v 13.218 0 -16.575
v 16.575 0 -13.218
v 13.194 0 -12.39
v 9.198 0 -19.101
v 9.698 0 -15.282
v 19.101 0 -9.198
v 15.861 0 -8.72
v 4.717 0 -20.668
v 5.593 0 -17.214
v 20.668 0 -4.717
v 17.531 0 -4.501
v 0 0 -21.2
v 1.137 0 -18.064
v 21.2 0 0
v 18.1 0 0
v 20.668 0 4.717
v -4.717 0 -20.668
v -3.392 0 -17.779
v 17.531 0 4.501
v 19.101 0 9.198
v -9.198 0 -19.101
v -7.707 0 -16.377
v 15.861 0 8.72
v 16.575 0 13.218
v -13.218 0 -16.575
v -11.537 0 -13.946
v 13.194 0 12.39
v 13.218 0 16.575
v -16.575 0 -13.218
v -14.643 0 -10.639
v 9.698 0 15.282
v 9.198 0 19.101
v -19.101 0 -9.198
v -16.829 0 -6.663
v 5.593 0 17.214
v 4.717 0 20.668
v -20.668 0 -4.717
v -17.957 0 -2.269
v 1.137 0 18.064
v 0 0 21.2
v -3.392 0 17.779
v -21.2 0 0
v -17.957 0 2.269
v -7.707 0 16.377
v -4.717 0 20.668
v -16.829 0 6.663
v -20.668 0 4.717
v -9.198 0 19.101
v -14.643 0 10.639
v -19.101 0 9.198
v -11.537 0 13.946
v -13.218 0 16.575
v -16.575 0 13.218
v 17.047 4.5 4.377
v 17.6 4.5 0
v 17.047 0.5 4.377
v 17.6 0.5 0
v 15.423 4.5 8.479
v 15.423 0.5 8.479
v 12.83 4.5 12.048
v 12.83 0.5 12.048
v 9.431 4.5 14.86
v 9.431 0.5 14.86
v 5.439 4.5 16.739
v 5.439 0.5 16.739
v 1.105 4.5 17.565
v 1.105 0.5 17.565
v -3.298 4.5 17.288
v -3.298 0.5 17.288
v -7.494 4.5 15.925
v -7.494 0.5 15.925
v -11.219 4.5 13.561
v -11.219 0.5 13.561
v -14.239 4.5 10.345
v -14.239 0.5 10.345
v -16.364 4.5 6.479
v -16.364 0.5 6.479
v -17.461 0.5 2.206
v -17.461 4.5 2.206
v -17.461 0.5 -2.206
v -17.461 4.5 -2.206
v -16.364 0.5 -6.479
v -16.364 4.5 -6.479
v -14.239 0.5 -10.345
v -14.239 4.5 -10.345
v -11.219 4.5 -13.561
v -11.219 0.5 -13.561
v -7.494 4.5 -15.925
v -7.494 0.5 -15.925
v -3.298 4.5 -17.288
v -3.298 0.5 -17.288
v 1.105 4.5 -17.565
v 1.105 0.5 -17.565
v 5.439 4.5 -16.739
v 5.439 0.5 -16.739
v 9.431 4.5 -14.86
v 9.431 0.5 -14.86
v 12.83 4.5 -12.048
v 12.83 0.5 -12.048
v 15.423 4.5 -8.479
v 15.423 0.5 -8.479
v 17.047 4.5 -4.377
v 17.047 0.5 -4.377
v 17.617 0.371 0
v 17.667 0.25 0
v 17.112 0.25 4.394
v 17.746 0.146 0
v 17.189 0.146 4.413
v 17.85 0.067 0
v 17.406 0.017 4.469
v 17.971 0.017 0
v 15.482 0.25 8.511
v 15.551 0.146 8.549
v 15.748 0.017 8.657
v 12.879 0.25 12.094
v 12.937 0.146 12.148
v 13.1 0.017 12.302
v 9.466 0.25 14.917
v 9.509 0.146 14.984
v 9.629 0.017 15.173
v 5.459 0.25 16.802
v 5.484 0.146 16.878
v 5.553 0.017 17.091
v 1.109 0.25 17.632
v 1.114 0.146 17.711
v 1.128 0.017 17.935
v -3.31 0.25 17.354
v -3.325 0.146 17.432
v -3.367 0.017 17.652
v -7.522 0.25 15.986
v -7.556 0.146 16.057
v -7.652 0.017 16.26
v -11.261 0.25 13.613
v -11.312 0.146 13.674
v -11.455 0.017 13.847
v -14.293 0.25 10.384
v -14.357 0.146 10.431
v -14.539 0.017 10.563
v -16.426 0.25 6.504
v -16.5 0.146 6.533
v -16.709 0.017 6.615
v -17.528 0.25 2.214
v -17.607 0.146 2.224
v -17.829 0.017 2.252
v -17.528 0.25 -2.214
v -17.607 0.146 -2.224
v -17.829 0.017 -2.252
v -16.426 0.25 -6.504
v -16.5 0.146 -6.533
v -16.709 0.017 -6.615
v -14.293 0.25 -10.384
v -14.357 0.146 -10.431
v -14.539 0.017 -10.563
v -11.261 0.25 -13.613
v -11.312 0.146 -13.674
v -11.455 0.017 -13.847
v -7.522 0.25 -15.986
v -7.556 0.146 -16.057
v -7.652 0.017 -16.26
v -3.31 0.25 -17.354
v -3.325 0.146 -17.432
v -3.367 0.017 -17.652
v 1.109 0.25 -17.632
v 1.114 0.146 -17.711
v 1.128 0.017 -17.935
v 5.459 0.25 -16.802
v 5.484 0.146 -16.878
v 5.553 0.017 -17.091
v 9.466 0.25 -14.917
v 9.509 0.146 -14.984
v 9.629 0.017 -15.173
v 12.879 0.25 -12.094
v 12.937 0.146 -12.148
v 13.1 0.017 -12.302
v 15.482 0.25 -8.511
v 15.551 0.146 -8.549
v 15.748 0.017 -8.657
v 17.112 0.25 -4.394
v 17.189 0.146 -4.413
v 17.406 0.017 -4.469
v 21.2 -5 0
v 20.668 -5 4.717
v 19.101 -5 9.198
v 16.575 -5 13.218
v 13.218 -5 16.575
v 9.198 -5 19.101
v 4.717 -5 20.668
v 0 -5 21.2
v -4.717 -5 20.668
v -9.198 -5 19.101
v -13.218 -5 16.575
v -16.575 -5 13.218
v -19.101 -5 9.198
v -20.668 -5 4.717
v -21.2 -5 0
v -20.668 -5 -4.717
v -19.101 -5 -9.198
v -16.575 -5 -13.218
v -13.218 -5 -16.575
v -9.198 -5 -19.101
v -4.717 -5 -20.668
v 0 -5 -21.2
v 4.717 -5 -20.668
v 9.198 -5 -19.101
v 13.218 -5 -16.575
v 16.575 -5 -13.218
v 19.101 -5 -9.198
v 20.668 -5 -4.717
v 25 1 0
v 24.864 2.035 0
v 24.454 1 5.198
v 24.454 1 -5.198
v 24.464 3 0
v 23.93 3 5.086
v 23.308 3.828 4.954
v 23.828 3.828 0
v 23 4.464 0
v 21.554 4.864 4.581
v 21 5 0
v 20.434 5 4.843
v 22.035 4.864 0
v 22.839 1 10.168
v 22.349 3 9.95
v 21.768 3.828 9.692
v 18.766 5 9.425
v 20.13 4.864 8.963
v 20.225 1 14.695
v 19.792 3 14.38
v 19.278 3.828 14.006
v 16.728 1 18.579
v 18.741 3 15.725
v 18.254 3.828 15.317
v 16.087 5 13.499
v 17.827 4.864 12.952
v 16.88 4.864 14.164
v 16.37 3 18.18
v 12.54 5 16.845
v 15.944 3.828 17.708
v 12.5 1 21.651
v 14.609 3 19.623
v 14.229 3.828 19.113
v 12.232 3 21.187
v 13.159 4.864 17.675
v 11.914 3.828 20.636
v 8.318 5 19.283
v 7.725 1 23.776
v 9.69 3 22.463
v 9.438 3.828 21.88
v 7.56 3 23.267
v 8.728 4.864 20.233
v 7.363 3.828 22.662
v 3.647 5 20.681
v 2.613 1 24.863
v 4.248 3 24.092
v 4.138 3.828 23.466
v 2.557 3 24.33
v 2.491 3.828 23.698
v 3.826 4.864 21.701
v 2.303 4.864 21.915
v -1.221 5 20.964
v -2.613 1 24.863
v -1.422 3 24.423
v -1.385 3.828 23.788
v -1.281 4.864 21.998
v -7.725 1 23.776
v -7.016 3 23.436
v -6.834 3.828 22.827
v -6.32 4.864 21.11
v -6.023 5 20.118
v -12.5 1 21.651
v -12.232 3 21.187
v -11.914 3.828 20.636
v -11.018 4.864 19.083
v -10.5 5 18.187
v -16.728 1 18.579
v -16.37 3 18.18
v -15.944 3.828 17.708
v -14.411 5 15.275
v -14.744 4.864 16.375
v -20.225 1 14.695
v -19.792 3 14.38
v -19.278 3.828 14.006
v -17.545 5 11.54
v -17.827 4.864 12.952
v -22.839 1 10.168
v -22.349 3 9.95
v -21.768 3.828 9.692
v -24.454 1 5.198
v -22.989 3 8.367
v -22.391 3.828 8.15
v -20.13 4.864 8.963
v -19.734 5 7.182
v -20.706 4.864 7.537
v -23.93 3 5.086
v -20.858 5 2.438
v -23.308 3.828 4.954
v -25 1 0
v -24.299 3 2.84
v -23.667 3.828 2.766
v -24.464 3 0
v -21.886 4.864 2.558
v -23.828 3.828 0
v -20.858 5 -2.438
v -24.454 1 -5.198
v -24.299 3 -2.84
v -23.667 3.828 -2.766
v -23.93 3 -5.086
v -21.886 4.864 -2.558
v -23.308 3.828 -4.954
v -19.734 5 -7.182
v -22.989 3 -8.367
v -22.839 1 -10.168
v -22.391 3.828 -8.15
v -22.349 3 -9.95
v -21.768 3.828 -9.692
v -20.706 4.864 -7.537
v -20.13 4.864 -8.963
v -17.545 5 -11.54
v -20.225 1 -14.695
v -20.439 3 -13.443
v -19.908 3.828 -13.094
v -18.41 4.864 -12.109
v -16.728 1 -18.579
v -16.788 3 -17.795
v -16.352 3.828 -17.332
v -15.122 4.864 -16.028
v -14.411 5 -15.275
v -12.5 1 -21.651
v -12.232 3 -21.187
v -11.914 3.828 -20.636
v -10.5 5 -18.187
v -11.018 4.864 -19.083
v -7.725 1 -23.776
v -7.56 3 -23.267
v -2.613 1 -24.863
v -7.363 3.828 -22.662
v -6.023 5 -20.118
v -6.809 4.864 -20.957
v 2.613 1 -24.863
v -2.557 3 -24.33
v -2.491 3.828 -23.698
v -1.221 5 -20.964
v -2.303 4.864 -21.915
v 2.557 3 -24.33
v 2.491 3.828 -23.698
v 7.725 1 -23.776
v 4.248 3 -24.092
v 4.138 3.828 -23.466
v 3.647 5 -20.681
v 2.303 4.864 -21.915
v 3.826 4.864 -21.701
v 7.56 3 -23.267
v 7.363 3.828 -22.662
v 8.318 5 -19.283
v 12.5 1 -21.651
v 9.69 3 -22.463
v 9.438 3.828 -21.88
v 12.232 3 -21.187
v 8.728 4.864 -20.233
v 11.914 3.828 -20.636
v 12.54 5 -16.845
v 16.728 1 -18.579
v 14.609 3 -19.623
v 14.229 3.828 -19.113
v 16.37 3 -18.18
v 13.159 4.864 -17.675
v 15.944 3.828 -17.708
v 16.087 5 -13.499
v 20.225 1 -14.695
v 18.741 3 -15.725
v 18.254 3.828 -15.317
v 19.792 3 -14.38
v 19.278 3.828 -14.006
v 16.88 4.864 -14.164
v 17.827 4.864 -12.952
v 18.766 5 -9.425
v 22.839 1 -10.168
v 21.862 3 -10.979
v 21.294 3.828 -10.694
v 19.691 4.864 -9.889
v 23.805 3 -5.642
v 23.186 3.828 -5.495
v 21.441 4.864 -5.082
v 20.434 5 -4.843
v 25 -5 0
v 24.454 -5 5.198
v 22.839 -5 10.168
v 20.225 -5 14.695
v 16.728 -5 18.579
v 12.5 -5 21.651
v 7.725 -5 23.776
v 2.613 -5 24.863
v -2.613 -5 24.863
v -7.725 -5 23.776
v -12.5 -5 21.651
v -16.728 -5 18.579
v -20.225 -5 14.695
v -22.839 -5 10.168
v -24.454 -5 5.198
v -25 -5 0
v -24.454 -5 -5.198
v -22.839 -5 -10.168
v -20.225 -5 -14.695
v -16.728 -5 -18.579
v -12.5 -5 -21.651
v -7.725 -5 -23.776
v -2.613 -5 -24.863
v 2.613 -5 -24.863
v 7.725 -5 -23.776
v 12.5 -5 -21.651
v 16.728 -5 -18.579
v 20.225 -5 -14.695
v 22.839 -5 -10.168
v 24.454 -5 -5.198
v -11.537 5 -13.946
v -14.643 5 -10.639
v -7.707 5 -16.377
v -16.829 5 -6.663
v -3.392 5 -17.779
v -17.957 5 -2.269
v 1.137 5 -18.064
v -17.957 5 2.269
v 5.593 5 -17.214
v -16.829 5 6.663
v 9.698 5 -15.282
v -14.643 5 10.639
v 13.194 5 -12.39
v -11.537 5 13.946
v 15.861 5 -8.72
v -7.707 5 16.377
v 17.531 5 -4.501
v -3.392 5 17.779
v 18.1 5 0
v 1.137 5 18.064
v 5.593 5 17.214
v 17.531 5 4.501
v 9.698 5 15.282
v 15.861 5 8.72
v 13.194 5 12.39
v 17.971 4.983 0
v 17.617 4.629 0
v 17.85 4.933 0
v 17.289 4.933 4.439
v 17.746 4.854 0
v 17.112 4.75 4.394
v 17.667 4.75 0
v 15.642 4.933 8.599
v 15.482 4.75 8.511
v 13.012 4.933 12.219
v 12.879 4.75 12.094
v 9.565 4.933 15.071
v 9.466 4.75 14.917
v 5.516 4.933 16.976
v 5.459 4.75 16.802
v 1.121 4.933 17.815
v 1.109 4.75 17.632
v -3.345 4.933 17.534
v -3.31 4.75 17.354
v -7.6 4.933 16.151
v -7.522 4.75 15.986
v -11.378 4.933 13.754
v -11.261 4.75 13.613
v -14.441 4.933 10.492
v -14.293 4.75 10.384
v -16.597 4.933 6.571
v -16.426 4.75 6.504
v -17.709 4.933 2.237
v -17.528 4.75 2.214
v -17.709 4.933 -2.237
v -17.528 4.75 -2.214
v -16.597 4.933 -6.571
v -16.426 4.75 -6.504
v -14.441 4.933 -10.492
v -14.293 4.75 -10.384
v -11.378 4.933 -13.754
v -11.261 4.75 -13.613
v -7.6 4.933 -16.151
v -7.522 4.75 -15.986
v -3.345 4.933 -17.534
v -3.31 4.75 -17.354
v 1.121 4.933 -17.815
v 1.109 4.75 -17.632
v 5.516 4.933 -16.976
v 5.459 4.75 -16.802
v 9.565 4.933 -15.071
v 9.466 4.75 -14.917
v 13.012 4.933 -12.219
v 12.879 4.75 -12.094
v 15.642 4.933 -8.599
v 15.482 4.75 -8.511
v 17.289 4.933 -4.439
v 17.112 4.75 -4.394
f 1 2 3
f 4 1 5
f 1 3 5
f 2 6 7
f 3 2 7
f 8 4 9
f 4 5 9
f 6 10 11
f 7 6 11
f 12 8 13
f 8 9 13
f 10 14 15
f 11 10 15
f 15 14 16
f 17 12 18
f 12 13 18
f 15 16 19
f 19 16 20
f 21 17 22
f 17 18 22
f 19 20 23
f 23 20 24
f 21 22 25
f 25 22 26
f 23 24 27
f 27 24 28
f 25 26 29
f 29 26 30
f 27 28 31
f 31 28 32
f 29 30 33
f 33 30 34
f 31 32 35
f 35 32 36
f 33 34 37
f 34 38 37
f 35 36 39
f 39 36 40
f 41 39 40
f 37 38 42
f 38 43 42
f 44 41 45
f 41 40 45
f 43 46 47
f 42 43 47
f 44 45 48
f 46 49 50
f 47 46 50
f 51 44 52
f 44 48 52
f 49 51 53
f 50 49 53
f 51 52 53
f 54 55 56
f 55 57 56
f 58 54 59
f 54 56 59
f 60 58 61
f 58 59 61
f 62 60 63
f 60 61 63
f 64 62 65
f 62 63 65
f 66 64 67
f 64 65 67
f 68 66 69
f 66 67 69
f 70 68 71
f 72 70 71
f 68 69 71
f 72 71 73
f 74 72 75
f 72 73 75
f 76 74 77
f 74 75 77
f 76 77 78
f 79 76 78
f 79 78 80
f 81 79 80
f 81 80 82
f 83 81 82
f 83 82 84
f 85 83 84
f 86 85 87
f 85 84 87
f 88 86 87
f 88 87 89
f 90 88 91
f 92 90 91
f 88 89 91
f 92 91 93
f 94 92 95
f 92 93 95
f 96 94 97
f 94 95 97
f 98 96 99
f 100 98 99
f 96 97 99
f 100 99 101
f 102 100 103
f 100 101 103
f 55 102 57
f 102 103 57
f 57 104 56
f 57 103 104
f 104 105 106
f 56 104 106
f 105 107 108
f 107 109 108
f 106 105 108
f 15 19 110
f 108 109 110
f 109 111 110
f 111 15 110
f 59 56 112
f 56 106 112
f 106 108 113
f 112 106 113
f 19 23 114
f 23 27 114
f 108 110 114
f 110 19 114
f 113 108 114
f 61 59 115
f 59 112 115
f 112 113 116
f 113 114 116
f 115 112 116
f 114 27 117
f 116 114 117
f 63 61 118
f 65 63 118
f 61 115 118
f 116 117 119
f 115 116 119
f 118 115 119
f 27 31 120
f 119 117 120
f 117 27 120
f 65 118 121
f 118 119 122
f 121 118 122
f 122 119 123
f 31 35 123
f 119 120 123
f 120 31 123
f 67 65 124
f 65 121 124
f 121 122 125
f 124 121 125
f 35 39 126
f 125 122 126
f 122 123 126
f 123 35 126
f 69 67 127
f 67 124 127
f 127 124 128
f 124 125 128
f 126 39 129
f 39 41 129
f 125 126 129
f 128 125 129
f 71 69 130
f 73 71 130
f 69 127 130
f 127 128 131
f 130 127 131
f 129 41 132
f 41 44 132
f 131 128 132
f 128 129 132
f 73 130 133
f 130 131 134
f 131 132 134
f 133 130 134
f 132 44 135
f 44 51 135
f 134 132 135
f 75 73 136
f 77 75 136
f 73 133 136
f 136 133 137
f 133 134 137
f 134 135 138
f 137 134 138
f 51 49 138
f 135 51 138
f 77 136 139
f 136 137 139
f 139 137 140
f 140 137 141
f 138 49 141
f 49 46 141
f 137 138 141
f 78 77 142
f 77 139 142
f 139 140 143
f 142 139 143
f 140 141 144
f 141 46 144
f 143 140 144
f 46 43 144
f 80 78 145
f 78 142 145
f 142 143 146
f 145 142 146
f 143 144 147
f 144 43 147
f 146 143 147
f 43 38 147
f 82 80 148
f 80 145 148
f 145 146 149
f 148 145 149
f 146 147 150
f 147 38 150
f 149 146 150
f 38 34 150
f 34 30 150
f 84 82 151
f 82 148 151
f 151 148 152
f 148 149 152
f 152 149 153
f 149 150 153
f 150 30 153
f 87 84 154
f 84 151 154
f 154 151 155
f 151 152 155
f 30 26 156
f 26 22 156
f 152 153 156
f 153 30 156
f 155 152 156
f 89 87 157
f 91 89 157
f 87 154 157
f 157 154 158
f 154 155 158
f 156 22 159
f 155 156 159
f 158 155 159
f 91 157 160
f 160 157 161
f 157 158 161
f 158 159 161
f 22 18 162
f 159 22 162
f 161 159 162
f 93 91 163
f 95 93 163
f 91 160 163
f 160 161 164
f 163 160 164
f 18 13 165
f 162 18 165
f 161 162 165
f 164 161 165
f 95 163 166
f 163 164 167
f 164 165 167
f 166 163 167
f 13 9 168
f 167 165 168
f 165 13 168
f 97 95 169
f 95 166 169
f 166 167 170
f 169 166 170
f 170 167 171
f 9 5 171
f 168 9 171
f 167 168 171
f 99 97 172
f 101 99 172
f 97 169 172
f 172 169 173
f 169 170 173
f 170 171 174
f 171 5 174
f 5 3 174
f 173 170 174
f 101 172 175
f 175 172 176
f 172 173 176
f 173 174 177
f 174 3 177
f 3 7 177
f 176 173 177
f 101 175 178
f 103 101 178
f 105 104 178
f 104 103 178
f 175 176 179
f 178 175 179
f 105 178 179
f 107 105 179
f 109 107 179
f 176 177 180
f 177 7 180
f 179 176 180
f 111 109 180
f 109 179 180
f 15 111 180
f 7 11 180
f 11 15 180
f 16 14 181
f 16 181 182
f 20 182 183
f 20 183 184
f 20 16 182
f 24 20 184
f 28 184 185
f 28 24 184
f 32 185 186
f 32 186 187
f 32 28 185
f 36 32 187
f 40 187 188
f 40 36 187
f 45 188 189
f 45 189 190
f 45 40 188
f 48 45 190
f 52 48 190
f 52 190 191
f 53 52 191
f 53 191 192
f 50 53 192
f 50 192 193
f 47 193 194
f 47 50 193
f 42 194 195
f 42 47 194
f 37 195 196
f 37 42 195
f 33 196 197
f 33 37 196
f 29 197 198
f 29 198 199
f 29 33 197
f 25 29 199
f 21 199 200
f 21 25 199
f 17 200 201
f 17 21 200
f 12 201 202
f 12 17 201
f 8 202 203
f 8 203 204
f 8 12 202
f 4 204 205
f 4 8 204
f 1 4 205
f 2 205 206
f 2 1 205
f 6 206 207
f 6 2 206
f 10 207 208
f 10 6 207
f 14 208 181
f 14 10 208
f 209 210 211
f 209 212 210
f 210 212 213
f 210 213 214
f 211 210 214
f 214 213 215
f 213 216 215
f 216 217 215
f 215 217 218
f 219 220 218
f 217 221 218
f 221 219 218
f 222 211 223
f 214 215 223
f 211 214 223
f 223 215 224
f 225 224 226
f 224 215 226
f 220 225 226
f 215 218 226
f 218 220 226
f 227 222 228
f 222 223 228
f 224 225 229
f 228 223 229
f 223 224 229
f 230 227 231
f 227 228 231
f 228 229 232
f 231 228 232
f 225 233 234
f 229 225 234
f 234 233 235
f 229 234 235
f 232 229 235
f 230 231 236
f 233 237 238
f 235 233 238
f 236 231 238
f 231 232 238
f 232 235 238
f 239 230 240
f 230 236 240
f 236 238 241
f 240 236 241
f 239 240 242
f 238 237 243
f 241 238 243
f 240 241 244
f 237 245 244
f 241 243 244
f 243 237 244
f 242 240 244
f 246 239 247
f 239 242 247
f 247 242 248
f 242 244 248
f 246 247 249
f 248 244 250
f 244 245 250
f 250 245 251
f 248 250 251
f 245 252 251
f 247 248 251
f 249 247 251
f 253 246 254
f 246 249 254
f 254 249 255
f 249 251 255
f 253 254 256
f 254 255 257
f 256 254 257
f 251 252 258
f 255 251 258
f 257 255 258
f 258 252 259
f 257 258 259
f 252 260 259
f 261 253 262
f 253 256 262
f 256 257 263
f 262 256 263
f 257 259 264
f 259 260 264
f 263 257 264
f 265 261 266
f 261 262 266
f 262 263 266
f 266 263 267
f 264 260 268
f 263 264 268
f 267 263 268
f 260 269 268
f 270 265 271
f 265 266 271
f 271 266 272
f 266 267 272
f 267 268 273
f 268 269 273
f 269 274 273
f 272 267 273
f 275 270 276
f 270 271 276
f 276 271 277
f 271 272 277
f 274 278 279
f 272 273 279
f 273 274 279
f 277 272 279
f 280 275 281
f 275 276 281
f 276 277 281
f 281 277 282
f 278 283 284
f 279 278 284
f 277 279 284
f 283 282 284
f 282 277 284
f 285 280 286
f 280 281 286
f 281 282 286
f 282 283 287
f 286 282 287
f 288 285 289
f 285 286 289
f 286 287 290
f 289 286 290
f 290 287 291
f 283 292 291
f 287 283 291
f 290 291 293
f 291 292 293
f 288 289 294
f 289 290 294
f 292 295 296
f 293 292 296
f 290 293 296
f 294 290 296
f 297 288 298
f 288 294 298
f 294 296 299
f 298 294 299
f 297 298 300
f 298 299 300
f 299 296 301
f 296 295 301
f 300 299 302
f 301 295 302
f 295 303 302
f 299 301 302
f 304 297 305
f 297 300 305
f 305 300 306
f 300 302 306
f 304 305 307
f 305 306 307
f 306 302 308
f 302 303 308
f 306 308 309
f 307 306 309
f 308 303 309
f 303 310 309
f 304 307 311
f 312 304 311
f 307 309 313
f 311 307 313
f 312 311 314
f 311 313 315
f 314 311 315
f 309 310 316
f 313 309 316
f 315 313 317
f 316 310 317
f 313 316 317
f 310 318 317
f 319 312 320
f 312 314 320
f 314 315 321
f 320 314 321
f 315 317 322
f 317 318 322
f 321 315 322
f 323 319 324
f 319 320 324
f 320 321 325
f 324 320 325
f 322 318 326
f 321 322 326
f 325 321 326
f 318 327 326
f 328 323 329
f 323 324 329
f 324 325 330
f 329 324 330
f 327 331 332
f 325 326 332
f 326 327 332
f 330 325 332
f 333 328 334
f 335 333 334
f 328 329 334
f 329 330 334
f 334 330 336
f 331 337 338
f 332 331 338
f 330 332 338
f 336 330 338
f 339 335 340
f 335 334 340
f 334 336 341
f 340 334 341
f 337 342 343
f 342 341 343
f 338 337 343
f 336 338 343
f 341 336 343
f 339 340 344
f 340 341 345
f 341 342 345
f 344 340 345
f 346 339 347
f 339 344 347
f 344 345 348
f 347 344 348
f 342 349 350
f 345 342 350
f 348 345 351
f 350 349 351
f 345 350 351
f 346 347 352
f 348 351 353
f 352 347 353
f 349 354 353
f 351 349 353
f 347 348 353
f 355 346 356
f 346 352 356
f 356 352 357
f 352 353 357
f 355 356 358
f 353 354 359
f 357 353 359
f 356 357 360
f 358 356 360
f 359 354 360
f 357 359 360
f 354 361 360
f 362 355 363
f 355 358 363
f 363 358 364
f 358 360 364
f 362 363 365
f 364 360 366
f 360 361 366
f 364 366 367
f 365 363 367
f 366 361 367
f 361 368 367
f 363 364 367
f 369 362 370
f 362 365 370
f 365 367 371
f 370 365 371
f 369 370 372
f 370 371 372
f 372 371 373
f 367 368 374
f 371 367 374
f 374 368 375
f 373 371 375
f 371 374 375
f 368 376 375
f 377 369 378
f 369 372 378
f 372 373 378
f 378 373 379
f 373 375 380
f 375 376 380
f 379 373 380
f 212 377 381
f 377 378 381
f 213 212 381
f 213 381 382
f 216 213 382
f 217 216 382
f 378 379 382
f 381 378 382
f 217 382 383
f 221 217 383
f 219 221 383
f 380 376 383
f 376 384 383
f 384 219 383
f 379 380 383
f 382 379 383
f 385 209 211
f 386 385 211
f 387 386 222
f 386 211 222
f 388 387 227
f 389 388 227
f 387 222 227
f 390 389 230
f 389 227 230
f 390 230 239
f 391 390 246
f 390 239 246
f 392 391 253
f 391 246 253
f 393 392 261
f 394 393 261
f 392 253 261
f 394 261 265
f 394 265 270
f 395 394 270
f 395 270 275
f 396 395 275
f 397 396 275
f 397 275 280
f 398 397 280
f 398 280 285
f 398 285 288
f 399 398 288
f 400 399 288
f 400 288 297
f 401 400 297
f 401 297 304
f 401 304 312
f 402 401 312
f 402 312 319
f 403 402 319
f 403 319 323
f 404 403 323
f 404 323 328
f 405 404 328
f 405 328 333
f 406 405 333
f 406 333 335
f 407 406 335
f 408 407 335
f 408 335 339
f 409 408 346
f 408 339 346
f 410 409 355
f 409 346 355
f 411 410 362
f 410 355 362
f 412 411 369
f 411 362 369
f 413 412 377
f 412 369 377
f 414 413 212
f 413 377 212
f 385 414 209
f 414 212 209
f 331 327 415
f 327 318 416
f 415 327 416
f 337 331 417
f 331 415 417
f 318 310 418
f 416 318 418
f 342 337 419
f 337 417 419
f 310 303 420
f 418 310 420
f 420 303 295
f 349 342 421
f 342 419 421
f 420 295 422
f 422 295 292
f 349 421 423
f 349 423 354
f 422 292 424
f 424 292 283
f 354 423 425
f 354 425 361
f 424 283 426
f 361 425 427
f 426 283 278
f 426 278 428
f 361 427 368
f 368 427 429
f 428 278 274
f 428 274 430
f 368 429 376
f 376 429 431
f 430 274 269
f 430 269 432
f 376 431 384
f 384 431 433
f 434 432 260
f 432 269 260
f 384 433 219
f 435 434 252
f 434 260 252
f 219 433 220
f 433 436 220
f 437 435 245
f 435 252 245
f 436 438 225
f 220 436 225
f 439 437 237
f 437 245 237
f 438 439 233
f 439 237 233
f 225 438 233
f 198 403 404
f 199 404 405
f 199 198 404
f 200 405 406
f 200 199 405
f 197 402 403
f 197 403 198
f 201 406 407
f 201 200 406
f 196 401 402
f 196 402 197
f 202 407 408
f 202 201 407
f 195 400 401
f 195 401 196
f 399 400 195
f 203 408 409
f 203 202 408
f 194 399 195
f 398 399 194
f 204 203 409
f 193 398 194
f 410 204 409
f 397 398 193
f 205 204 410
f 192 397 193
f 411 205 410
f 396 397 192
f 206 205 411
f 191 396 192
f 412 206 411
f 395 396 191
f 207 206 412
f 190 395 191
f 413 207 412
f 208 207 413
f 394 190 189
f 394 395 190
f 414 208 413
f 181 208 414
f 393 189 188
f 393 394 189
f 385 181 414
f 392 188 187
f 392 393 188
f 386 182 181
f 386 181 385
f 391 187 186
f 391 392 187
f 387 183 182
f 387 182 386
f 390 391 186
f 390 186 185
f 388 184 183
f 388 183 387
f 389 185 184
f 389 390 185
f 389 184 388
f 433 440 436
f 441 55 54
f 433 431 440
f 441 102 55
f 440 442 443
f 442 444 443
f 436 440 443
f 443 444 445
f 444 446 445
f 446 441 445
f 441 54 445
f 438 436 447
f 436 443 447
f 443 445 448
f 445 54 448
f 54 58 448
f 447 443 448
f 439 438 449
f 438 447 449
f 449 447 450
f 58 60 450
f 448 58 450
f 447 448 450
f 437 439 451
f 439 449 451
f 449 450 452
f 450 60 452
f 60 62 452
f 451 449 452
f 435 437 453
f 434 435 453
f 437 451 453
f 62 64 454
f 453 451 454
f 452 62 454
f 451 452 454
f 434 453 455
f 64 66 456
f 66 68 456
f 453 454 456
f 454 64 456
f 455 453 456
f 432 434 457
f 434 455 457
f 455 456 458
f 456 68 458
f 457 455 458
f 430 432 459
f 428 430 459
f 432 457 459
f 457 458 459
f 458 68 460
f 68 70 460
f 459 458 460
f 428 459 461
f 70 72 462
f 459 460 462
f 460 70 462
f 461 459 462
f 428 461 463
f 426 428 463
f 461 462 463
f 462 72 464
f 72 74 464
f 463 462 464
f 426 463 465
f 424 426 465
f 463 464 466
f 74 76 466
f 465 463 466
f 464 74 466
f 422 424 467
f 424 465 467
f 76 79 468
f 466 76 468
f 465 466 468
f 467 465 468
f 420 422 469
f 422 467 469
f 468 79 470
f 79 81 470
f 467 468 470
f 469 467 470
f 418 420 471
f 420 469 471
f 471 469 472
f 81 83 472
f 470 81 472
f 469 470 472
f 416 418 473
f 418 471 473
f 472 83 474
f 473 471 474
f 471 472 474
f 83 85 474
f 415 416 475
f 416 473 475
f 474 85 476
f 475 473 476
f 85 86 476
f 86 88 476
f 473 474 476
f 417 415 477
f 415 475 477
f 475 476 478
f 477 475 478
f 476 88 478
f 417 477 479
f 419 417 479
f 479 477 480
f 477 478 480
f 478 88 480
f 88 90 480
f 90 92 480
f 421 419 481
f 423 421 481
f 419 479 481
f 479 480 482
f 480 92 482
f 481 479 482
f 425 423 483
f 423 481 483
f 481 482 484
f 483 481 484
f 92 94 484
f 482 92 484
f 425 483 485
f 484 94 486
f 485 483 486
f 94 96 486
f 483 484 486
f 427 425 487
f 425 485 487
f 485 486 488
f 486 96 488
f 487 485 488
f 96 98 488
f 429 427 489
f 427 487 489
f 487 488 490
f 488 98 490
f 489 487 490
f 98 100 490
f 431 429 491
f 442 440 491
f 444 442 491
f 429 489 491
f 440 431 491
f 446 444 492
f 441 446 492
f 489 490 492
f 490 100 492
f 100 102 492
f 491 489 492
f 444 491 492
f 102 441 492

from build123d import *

# Parameters (mm, degrees)
F0_R     = 25
F0_R_2   = 21.2
F1_DEPTH = 5


with BuildPart() as f1:
    # F0 (on Front) → F1 (new body)
    with BuildSketch(Plane.XZ):
        Circle(F0_R)
        Circle(F0_R_2, mode=Mode.SUBTRACT)
    extrude(amount=F1_DEPTH)

    # F2 (on Top) → F3 (revolve)
    with BuildSketch(Plane.XY):
        with BuildLine():
            Line((17.6, 4.5), (17.6, 0.5))
            ThreePointArc((17.6, 0.5), (17.746447, 0.146447), (18.1, 0))
            Line((18.1, 0), (25, 0))
            Line((25, 0), (25, 1))
            ThreePointArc((25, 1), (23.828427, 3.828427), (21, 5))
            Line((21, 5), (18.1, 5))
            ThreePointArc((18.1, 5), (17.746447, 4.853553), (17.6, 4.5))
        make_face()
    revolve(axis=Axis((0, 0, 0), (0, -1, 0)))


solid = f1.part
